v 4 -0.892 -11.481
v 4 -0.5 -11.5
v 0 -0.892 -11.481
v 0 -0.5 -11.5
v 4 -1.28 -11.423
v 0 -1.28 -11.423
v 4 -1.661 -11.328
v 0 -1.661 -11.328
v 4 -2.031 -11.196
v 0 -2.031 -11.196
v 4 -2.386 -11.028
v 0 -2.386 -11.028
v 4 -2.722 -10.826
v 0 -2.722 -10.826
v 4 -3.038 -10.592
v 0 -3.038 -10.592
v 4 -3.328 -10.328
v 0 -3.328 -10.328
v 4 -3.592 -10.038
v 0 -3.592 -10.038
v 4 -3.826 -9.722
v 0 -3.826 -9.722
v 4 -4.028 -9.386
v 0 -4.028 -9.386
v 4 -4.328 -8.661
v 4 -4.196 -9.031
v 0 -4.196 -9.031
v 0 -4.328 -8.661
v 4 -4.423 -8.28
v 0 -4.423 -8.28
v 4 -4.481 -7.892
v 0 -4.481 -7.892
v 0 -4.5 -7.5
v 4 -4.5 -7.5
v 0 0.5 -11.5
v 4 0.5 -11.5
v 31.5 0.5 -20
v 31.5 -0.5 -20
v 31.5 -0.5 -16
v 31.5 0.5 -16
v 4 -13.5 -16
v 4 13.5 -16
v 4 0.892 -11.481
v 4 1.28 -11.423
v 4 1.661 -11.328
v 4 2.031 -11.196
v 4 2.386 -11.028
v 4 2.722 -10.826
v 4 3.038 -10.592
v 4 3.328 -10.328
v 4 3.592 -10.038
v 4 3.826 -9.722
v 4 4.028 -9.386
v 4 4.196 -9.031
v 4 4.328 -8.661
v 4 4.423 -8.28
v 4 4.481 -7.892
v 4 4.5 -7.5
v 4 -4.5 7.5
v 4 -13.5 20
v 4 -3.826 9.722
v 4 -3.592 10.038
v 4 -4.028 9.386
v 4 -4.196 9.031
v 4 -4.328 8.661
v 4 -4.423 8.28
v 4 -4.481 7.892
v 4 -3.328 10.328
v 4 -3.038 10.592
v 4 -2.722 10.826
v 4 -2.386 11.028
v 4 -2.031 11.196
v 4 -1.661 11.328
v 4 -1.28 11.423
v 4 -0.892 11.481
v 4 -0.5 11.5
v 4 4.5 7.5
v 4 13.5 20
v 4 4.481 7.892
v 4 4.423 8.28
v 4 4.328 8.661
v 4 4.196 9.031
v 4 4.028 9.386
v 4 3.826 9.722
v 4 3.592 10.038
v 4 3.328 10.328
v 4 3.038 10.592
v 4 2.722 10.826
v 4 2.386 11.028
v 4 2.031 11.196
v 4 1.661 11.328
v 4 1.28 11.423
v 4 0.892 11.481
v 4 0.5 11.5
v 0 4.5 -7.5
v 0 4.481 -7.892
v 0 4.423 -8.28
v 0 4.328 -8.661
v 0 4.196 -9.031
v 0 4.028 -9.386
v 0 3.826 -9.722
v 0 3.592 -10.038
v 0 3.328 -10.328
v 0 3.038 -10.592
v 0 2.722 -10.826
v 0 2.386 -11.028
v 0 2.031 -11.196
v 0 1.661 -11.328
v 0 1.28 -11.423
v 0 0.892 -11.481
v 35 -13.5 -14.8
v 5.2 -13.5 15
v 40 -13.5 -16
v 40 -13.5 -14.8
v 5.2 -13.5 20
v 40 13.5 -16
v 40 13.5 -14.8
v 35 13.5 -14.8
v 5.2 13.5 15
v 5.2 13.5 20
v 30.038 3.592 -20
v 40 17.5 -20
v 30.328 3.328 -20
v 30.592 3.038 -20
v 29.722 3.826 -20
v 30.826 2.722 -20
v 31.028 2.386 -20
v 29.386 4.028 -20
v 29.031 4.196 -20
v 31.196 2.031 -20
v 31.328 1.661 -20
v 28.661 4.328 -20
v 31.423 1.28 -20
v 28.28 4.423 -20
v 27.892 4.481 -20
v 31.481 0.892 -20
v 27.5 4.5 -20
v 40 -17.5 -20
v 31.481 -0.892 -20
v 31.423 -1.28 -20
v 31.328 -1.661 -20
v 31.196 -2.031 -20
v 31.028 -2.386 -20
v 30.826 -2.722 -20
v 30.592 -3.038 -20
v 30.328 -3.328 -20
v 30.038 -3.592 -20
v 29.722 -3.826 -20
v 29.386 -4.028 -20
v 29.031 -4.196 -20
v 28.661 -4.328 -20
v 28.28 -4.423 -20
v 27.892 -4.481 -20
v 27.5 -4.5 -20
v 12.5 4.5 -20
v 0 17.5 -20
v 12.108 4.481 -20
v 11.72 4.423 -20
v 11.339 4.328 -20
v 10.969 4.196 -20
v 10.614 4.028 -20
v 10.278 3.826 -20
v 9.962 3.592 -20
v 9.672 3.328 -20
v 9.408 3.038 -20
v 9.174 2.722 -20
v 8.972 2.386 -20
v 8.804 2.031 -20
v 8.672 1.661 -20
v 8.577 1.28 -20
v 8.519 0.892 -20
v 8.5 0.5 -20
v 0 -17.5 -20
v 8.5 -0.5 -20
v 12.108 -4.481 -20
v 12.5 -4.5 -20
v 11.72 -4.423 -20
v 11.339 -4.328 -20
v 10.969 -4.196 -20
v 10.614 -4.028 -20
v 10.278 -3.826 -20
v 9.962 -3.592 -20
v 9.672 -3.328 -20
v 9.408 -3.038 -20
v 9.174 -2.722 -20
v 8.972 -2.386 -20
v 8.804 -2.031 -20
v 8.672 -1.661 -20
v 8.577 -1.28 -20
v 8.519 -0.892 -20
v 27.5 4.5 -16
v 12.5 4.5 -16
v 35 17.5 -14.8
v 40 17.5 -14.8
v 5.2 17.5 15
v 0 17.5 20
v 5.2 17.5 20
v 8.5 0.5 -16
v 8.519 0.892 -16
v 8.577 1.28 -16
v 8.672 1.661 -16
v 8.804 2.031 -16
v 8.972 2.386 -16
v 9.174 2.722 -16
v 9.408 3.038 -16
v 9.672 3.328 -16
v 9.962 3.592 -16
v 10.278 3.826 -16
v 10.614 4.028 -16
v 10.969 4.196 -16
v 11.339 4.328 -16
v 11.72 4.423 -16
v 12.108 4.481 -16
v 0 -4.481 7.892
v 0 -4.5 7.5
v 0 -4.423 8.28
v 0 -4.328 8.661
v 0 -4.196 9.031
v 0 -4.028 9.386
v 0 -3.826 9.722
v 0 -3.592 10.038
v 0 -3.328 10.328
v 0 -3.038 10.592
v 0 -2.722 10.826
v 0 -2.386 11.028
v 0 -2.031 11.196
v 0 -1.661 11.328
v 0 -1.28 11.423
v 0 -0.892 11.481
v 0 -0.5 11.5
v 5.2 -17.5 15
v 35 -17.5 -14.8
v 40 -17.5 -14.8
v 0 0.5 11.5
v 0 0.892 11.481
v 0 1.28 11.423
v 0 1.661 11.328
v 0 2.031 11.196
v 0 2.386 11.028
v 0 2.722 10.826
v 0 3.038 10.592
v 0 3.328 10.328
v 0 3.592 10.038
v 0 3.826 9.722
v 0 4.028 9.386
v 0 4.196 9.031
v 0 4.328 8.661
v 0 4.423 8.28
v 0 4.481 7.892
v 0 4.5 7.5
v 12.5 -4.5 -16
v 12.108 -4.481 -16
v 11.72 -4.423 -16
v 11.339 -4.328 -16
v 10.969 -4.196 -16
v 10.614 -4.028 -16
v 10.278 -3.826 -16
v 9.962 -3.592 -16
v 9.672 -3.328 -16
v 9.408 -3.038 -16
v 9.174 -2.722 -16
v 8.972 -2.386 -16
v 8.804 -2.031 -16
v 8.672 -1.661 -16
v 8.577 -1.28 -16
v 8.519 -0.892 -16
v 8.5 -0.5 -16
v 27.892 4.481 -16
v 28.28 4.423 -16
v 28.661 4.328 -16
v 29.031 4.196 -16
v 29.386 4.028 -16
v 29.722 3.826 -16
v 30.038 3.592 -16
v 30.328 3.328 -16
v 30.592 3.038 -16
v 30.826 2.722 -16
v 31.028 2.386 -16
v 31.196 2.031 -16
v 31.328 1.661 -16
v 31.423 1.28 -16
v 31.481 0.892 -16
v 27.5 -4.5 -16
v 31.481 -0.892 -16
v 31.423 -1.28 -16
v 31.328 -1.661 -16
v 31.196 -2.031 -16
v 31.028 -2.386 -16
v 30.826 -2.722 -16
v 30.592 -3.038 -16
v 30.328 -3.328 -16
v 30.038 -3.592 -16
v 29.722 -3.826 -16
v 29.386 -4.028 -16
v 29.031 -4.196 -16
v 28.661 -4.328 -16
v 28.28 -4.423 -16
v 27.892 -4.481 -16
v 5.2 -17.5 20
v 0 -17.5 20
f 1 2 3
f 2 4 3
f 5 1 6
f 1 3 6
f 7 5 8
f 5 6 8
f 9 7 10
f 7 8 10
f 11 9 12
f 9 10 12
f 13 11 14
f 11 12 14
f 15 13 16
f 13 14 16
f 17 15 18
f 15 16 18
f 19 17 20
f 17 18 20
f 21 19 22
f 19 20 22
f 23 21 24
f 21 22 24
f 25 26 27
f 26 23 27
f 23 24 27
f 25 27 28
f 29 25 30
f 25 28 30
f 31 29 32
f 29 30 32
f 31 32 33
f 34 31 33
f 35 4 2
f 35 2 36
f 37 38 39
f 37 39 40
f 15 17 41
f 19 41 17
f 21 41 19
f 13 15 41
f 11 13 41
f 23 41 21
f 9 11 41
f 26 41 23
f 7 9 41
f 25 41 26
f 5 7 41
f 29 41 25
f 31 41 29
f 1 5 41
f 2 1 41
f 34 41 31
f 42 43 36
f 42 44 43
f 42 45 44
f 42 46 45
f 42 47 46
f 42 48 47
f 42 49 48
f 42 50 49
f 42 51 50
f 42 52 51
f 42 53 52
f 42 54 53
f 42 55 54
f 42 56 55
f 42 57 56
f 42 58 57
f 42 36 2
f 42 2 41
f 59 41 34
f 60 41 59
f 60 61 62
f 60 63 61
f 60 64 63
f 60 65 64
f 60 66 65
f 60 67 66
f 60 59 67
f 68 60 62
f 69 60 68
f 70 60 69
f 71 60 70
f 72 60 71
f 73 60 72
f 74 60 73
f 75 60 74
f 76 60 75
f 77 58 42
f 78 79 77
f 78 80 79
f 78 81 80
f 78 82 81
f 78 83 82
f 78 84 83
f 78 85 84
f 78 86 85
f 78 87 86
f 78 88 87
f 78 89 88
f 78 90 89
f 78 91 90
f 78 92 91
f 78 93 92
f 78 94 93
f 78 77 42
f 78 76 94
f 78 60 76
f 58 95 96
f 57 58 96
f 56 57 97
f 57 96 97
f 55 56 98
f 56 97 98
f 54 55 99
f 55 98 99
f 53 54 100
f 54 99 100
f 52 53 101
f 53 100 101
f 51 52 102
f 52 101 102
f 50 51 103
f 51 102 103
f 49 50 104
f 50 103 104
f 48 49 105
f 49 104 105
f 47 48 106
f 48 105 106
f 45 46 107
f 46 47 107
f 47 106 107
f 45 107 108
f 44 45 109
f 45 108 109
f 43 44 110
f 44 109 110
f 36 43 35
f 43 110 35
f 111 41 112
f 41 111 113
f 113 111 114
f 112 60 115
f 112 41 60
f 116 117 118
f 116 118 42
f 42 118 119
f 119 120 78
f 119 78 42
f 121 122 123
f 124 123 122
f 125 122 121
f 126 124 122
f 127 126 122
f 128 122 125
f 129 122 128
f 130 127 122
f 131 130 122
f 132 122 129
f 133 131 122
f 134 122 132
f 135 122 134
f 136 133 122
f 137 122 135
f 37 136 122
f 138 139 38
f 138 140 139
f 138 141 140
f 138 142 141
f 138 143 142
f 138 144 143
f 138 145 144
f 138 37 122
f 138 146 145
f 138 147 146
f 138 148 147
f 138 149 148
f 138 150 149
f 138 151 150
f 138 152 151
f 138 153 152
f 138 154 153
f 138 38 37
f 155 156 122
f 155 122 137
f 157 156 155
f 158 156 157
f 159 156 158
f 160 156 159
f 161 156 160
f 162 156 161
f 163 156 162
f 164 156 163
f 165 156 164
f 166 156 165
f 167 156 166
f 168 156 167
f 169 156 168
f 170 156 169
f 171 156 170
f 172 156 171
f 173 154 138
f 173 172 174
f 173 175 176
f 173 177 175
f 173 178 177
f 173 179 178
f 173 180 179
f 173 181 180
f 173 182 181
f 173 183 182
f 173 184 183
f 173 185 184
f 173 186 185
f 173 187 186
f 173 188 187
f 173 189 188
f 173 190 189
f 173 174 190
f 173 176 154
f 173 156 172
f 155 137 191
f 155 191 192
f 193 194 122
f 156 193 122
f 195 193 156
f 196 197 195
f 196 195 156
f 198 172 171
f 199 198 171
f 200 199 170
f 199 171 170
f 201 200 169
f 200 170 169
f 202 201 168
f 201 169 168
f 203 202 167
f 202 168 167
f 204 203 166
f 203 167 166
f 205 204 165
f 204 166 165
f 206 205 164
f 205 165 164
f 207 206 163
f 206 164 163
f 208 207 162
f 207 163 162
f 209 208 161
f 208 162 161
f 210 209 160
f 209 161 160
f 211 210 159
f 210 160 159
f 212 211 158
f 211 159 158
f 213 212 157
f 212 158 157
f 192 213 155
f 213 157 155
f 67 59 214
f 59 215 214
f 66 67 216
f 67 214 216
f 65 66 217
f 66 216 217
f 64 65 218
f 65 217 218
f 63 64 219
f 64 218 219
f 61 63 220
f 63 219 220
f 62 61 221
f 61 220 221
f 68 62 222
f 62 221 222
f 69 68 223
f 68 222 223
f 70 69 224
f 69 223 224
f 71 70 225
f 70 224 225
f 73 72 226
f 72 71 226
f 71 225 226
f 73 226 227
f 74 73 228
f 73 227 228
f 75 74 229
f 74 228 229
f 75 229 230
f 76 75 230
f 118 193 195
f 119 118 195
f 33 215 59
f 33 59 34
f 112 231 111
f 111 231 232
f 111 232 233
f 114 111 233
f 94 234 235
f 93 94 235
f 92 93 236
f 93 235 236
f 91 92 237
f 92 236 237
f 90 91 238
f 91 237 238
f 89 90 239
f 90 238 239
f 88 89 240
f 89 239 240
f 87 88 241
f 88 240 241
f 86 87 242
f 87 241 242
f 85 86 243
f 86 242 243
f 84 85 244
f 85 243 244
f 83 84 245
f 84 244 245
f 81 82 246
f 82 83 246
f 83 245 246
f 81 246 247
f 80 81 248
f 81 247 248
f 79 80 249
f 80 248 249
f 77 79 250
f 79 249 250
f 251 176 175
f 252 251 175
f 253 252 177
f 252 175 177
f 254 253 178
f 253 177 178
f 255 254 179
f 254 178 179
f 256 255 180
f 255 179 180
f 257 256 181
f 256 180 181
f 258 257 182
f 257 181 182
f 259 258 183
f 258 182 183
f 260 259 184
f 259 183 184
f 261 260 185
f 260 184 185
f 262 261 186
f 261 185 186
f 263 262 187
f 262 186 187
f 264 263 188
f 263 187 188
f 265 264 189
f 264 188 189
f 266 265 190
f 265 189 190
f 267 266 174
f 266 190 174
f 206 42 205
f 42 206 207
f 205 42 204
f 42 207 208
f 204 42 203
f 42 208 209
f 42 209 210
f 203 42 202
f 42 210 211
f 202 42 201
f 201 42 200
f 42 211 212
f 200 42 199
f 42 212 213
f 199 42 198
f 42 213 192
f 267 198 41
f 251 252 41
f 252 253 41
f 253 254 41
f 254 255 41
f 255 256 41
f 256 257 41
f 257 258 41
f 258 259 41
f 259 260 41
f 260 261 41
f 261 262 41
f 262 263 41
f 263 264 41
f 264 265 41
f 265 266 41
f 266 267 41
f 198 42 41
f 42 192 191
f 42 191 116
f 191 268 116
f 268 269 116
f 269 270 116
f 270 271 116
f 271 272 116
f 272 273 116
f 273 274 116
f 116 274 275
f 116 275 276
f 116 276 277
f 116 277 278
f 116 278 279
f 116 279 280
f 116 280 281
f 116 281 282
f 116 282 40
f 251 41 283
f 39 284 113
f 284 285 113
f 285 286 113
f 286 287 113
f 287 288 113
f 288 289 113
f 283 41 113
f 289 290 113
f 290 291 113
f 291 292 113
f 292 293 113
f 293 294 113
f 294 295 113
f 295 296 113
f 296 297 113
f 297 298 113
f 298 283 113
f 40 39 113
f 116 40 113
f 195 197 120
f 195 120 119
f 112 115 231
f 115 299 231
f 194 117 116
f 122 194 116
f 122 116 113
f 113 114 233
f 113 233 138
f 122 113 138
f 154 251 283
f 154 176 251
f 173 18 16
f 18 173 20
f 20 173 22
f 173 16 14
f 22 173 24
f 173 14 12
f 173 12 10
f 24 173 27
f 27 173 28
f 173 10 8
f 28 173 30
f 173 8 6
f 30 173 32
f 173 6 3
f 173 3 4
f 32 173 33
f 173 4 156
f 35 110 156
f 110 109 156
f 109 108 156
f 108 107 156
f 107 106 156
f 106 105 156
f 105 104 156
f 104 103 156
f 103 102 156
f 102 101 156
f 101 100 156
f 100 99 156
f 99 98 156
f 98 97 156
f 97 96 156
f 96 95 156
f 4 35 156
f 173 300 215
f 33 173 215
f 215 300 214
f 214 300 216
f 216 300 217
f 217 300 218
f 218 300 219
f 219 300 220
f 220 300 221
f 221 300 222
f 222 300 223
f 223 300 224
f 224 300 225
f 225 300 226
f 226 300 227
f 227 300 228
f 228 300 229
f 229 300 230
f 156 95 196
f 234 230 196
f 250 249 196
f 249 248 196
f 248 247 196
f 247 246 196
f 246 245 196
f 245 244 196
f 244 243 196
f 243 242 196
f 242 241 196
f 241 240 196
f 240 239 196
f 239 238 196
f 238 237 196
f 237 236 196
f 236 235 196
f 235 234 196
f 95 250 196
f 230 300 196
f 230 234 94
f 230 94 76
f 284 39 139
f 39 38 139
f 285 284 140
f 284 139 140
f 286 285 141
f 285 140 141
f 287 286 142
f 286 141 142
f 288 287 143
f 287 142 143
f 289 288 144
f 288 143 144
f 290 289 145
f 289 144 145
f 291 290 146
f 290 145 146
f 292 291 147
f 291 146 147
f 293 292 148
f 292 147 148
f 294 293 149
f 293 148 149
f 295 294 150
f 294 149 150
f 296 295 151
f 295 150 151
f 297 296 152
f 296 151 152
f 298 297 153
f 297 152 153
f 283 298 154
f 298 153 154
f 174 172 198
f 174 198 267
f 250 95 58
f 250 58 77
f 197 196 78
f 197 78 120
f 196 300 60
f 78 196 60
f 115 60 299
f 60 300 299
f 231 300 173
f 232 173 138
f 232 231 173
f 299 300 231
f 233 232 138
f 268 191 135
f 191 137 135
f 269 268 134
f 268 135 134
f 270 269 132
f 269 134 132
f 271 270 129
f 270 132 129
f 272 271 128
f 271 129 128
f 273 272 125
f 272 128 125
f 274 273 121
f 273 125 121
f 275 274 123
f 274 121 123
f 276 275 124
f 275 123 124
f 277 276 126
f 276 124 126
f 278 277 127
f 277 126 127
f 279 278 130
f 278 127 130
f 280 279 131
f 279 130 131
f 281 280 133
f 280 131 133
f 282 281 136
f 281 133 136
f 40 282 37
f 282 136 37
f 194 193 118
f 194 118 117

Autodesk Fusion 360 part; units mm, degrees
sketch "Sketch1" plane through (0, 0, 0) normal (1, 0, 0) x (0, 1, 0)
  line L0 (17.5, -20) -> (-17.5, -20)
  line L1 (-17.5, -20) -> (-17.5, 20)
  line L2 (-17.5, 20) -> (17.5, 20)
  line L3 (17.5, 20) -> (17.5, -20)
  line L4 (17.5, -20) -> (-17.5, 20) construction
  line L5 (-17.5, -20) -> (17.5, 20) construction
  line L6 (0.5, 11.5) -> (-0.5, 11.5)
  line L7 (-4.5, 7.5) -> (-4.5, -7.5)
  line L8 (-0.5, -11.5) -> (0.5, -11.5)
  line L9 (4.5, -7.5) -> (4.5, 7.5)
  line L10 (4.5, 11.5) -> (-4.5, -11.5) construction
  line L11 (-4.5, 11.5) -> (4.5, -11.5) construction
  arc A0 (-0.5, 11.5) -> (-4.5, 7.5) centre (-0.5, 7.5) ccw
  arc A1 (4.5, 7.5) -> (0.5, 11.5) centre (0.5, 7.5) ccw
  arc A2 (-4.5, -7.5) -> (-0.5, -11.5) centre (-0.5, -7.5) ccw
  arc A3 (0.5, -11.5) -> (4.5, -7.5) centre (0.5, -7.5) ccw
  dimension "d1" = 35
  dimension "d2" = 40
  dimension "d3" = 9
  dimension "d4" = 23
  dimension "d5" = 4
  dimension "d6" = 4
  dimension "d7" = 4
  dimension "d8" = 4
extrude "Extrude1" add sketch "Sketch1" along normal blind 4
sketch "Sketch2" plane through (0, 0, -20) normal (0, 0, -1) x (1, 0, 0)
  line L0 (0, 17.5) -> (0, -17.5)
  line L1 (0, -17.5) -> (4, -17.5)
  line L2 (4, -17.5) -> (4, 17.5)
  line L3 (4, 17.5) -> (0, 17.5)
  line L4 (4, -17.5) -> (40, -17.5)
  line L5 (40, -17.5) -> (40, 17.5)
  line L6 (40, 17.5) -> (4, 17.5)
  line L7 (4, -17.5) -> (4, 17.5)
  line L8 (12.5, 4.5) -> (27.5, 4.5)
  line L9 (31.5, 0.5) -> (31.5, -0.5)
  line L10 (27.5, -4.5) -> (12.5, -4.5)
  line L11 (8.5, -0.5) -> (8.5, 0.5)
  line L12 (8.5, 4.5) -> (31.5, -4.5) construction
  line L13 (31.5, 4.5) -> (8.5, -4.5) construction
  arc A0 (27.5, -4.5) -> (31.5, -0.5) centre (27.5, -0.5) ccw
  arc A1 (8.5, -0.5) -> (12.5, -4.5) centre (12.5, -0.5) ccw
  arc A2 (12.5, 4.5) -> (8.5, 0.5) centre (12.5, 0.5) ccw
  arc A3 (31.5, 0.5) -> (27.5, 4.5) centre (27.5, 0.5) ccw
  point P0 (20, -17.5)
  point P1 (20, 0)
  point P2 (20, 0)
  dimension "d11" = 40
  dimension "d13" = 17.5
  dimension "d14" = 20
  dimension "d15" = 23
  dimension "d16" = 9
  dimension "d17" = 4
  dimension "d18" = 4
  dimension "d19" = 4
  dimension "d20" = 4
extrude "Extrude2" add sketch "Sketch2" against normal blind 4 contours L2 L4 L5 L6 L7
sketch "Sketch3" plane through (0, 17.5, 0) normal (0, 1, 0) x (-1, 0, 0)
  line L0 (0, -20) -> (0, 20)
  line L1 (0, 20) -> (-4, 20)
  line L2 (-4, 20) -> (-4, -16)
  line L3 (-4, -16) -> (-40, -16)
  line L4 (-40, -16) -> (-40, -20)
  line L5 (-40, -20) -> (0, -20)
  line L6 (-4, 20) -> (-5.2, 20)
  line L7 (-5.2, -16) -> (-4, -16)
  line L8 (-4, -16) -> (-4, 20)
  line L9 (-40, -16) -> (-5.2, -16)
  line L10 (-5.2, -16) -> (-5.2, -14.8)
  line L11 (-35, -14.8) -> (-40, -14.8)
  line L12 (-40, -14.8) -> (-40, -16)
  line L13 (-35, -14.8) -> (-5.2, 15)
  line L14 (-35, -14.8) -> (6.8148, -14.8) construction
  line L15 (-5.2, 20) -> (-5.2, 15)
  line L16 (-5.2, -14.8) -> (-5.2, -16)
  dimension "d23" = 1.2
  dimension "d24" = 1.2
  dimension "d25" = 45
  dimension "d26" = 5
extrude "Extrude3" add sketch "Sketch3" against normal blind 4 contours L2 L3 L6 L7 L8 L9 L11 L12 L13 L15
sketch "Sketch4" plane through (0, -17.5, 0) normal (0, -1, 0) x (1, 0, 0)
  line L0 (0, 20) -> (0, -20)
  line L1 (0, -20) -> (40, -20)
  line L2 (40, -20) -> (40, -16)
  line L3 (40, -16) -> (4, -16)
  line L4 (4, -16) -> (4, 20)
  line L5 (4, 20) -> (0, 20)
  line L6 (4, 20) -> (5.2, 20)
  line L7 (5.2, 20) -> (5.2, 15)
  line L8 (5.2, 15) -> (35, -14.8)
  line L9 (35, -14.8) -> (40, -14.8)
  line L10 (40, -14.8) -> (40, -16)
  dimension "d29" = 1.2
extrude "Extrude4" add sketch "Sketch4" against normal blind 4 contours L3 L4 L6 L7 L8 L9 L10
